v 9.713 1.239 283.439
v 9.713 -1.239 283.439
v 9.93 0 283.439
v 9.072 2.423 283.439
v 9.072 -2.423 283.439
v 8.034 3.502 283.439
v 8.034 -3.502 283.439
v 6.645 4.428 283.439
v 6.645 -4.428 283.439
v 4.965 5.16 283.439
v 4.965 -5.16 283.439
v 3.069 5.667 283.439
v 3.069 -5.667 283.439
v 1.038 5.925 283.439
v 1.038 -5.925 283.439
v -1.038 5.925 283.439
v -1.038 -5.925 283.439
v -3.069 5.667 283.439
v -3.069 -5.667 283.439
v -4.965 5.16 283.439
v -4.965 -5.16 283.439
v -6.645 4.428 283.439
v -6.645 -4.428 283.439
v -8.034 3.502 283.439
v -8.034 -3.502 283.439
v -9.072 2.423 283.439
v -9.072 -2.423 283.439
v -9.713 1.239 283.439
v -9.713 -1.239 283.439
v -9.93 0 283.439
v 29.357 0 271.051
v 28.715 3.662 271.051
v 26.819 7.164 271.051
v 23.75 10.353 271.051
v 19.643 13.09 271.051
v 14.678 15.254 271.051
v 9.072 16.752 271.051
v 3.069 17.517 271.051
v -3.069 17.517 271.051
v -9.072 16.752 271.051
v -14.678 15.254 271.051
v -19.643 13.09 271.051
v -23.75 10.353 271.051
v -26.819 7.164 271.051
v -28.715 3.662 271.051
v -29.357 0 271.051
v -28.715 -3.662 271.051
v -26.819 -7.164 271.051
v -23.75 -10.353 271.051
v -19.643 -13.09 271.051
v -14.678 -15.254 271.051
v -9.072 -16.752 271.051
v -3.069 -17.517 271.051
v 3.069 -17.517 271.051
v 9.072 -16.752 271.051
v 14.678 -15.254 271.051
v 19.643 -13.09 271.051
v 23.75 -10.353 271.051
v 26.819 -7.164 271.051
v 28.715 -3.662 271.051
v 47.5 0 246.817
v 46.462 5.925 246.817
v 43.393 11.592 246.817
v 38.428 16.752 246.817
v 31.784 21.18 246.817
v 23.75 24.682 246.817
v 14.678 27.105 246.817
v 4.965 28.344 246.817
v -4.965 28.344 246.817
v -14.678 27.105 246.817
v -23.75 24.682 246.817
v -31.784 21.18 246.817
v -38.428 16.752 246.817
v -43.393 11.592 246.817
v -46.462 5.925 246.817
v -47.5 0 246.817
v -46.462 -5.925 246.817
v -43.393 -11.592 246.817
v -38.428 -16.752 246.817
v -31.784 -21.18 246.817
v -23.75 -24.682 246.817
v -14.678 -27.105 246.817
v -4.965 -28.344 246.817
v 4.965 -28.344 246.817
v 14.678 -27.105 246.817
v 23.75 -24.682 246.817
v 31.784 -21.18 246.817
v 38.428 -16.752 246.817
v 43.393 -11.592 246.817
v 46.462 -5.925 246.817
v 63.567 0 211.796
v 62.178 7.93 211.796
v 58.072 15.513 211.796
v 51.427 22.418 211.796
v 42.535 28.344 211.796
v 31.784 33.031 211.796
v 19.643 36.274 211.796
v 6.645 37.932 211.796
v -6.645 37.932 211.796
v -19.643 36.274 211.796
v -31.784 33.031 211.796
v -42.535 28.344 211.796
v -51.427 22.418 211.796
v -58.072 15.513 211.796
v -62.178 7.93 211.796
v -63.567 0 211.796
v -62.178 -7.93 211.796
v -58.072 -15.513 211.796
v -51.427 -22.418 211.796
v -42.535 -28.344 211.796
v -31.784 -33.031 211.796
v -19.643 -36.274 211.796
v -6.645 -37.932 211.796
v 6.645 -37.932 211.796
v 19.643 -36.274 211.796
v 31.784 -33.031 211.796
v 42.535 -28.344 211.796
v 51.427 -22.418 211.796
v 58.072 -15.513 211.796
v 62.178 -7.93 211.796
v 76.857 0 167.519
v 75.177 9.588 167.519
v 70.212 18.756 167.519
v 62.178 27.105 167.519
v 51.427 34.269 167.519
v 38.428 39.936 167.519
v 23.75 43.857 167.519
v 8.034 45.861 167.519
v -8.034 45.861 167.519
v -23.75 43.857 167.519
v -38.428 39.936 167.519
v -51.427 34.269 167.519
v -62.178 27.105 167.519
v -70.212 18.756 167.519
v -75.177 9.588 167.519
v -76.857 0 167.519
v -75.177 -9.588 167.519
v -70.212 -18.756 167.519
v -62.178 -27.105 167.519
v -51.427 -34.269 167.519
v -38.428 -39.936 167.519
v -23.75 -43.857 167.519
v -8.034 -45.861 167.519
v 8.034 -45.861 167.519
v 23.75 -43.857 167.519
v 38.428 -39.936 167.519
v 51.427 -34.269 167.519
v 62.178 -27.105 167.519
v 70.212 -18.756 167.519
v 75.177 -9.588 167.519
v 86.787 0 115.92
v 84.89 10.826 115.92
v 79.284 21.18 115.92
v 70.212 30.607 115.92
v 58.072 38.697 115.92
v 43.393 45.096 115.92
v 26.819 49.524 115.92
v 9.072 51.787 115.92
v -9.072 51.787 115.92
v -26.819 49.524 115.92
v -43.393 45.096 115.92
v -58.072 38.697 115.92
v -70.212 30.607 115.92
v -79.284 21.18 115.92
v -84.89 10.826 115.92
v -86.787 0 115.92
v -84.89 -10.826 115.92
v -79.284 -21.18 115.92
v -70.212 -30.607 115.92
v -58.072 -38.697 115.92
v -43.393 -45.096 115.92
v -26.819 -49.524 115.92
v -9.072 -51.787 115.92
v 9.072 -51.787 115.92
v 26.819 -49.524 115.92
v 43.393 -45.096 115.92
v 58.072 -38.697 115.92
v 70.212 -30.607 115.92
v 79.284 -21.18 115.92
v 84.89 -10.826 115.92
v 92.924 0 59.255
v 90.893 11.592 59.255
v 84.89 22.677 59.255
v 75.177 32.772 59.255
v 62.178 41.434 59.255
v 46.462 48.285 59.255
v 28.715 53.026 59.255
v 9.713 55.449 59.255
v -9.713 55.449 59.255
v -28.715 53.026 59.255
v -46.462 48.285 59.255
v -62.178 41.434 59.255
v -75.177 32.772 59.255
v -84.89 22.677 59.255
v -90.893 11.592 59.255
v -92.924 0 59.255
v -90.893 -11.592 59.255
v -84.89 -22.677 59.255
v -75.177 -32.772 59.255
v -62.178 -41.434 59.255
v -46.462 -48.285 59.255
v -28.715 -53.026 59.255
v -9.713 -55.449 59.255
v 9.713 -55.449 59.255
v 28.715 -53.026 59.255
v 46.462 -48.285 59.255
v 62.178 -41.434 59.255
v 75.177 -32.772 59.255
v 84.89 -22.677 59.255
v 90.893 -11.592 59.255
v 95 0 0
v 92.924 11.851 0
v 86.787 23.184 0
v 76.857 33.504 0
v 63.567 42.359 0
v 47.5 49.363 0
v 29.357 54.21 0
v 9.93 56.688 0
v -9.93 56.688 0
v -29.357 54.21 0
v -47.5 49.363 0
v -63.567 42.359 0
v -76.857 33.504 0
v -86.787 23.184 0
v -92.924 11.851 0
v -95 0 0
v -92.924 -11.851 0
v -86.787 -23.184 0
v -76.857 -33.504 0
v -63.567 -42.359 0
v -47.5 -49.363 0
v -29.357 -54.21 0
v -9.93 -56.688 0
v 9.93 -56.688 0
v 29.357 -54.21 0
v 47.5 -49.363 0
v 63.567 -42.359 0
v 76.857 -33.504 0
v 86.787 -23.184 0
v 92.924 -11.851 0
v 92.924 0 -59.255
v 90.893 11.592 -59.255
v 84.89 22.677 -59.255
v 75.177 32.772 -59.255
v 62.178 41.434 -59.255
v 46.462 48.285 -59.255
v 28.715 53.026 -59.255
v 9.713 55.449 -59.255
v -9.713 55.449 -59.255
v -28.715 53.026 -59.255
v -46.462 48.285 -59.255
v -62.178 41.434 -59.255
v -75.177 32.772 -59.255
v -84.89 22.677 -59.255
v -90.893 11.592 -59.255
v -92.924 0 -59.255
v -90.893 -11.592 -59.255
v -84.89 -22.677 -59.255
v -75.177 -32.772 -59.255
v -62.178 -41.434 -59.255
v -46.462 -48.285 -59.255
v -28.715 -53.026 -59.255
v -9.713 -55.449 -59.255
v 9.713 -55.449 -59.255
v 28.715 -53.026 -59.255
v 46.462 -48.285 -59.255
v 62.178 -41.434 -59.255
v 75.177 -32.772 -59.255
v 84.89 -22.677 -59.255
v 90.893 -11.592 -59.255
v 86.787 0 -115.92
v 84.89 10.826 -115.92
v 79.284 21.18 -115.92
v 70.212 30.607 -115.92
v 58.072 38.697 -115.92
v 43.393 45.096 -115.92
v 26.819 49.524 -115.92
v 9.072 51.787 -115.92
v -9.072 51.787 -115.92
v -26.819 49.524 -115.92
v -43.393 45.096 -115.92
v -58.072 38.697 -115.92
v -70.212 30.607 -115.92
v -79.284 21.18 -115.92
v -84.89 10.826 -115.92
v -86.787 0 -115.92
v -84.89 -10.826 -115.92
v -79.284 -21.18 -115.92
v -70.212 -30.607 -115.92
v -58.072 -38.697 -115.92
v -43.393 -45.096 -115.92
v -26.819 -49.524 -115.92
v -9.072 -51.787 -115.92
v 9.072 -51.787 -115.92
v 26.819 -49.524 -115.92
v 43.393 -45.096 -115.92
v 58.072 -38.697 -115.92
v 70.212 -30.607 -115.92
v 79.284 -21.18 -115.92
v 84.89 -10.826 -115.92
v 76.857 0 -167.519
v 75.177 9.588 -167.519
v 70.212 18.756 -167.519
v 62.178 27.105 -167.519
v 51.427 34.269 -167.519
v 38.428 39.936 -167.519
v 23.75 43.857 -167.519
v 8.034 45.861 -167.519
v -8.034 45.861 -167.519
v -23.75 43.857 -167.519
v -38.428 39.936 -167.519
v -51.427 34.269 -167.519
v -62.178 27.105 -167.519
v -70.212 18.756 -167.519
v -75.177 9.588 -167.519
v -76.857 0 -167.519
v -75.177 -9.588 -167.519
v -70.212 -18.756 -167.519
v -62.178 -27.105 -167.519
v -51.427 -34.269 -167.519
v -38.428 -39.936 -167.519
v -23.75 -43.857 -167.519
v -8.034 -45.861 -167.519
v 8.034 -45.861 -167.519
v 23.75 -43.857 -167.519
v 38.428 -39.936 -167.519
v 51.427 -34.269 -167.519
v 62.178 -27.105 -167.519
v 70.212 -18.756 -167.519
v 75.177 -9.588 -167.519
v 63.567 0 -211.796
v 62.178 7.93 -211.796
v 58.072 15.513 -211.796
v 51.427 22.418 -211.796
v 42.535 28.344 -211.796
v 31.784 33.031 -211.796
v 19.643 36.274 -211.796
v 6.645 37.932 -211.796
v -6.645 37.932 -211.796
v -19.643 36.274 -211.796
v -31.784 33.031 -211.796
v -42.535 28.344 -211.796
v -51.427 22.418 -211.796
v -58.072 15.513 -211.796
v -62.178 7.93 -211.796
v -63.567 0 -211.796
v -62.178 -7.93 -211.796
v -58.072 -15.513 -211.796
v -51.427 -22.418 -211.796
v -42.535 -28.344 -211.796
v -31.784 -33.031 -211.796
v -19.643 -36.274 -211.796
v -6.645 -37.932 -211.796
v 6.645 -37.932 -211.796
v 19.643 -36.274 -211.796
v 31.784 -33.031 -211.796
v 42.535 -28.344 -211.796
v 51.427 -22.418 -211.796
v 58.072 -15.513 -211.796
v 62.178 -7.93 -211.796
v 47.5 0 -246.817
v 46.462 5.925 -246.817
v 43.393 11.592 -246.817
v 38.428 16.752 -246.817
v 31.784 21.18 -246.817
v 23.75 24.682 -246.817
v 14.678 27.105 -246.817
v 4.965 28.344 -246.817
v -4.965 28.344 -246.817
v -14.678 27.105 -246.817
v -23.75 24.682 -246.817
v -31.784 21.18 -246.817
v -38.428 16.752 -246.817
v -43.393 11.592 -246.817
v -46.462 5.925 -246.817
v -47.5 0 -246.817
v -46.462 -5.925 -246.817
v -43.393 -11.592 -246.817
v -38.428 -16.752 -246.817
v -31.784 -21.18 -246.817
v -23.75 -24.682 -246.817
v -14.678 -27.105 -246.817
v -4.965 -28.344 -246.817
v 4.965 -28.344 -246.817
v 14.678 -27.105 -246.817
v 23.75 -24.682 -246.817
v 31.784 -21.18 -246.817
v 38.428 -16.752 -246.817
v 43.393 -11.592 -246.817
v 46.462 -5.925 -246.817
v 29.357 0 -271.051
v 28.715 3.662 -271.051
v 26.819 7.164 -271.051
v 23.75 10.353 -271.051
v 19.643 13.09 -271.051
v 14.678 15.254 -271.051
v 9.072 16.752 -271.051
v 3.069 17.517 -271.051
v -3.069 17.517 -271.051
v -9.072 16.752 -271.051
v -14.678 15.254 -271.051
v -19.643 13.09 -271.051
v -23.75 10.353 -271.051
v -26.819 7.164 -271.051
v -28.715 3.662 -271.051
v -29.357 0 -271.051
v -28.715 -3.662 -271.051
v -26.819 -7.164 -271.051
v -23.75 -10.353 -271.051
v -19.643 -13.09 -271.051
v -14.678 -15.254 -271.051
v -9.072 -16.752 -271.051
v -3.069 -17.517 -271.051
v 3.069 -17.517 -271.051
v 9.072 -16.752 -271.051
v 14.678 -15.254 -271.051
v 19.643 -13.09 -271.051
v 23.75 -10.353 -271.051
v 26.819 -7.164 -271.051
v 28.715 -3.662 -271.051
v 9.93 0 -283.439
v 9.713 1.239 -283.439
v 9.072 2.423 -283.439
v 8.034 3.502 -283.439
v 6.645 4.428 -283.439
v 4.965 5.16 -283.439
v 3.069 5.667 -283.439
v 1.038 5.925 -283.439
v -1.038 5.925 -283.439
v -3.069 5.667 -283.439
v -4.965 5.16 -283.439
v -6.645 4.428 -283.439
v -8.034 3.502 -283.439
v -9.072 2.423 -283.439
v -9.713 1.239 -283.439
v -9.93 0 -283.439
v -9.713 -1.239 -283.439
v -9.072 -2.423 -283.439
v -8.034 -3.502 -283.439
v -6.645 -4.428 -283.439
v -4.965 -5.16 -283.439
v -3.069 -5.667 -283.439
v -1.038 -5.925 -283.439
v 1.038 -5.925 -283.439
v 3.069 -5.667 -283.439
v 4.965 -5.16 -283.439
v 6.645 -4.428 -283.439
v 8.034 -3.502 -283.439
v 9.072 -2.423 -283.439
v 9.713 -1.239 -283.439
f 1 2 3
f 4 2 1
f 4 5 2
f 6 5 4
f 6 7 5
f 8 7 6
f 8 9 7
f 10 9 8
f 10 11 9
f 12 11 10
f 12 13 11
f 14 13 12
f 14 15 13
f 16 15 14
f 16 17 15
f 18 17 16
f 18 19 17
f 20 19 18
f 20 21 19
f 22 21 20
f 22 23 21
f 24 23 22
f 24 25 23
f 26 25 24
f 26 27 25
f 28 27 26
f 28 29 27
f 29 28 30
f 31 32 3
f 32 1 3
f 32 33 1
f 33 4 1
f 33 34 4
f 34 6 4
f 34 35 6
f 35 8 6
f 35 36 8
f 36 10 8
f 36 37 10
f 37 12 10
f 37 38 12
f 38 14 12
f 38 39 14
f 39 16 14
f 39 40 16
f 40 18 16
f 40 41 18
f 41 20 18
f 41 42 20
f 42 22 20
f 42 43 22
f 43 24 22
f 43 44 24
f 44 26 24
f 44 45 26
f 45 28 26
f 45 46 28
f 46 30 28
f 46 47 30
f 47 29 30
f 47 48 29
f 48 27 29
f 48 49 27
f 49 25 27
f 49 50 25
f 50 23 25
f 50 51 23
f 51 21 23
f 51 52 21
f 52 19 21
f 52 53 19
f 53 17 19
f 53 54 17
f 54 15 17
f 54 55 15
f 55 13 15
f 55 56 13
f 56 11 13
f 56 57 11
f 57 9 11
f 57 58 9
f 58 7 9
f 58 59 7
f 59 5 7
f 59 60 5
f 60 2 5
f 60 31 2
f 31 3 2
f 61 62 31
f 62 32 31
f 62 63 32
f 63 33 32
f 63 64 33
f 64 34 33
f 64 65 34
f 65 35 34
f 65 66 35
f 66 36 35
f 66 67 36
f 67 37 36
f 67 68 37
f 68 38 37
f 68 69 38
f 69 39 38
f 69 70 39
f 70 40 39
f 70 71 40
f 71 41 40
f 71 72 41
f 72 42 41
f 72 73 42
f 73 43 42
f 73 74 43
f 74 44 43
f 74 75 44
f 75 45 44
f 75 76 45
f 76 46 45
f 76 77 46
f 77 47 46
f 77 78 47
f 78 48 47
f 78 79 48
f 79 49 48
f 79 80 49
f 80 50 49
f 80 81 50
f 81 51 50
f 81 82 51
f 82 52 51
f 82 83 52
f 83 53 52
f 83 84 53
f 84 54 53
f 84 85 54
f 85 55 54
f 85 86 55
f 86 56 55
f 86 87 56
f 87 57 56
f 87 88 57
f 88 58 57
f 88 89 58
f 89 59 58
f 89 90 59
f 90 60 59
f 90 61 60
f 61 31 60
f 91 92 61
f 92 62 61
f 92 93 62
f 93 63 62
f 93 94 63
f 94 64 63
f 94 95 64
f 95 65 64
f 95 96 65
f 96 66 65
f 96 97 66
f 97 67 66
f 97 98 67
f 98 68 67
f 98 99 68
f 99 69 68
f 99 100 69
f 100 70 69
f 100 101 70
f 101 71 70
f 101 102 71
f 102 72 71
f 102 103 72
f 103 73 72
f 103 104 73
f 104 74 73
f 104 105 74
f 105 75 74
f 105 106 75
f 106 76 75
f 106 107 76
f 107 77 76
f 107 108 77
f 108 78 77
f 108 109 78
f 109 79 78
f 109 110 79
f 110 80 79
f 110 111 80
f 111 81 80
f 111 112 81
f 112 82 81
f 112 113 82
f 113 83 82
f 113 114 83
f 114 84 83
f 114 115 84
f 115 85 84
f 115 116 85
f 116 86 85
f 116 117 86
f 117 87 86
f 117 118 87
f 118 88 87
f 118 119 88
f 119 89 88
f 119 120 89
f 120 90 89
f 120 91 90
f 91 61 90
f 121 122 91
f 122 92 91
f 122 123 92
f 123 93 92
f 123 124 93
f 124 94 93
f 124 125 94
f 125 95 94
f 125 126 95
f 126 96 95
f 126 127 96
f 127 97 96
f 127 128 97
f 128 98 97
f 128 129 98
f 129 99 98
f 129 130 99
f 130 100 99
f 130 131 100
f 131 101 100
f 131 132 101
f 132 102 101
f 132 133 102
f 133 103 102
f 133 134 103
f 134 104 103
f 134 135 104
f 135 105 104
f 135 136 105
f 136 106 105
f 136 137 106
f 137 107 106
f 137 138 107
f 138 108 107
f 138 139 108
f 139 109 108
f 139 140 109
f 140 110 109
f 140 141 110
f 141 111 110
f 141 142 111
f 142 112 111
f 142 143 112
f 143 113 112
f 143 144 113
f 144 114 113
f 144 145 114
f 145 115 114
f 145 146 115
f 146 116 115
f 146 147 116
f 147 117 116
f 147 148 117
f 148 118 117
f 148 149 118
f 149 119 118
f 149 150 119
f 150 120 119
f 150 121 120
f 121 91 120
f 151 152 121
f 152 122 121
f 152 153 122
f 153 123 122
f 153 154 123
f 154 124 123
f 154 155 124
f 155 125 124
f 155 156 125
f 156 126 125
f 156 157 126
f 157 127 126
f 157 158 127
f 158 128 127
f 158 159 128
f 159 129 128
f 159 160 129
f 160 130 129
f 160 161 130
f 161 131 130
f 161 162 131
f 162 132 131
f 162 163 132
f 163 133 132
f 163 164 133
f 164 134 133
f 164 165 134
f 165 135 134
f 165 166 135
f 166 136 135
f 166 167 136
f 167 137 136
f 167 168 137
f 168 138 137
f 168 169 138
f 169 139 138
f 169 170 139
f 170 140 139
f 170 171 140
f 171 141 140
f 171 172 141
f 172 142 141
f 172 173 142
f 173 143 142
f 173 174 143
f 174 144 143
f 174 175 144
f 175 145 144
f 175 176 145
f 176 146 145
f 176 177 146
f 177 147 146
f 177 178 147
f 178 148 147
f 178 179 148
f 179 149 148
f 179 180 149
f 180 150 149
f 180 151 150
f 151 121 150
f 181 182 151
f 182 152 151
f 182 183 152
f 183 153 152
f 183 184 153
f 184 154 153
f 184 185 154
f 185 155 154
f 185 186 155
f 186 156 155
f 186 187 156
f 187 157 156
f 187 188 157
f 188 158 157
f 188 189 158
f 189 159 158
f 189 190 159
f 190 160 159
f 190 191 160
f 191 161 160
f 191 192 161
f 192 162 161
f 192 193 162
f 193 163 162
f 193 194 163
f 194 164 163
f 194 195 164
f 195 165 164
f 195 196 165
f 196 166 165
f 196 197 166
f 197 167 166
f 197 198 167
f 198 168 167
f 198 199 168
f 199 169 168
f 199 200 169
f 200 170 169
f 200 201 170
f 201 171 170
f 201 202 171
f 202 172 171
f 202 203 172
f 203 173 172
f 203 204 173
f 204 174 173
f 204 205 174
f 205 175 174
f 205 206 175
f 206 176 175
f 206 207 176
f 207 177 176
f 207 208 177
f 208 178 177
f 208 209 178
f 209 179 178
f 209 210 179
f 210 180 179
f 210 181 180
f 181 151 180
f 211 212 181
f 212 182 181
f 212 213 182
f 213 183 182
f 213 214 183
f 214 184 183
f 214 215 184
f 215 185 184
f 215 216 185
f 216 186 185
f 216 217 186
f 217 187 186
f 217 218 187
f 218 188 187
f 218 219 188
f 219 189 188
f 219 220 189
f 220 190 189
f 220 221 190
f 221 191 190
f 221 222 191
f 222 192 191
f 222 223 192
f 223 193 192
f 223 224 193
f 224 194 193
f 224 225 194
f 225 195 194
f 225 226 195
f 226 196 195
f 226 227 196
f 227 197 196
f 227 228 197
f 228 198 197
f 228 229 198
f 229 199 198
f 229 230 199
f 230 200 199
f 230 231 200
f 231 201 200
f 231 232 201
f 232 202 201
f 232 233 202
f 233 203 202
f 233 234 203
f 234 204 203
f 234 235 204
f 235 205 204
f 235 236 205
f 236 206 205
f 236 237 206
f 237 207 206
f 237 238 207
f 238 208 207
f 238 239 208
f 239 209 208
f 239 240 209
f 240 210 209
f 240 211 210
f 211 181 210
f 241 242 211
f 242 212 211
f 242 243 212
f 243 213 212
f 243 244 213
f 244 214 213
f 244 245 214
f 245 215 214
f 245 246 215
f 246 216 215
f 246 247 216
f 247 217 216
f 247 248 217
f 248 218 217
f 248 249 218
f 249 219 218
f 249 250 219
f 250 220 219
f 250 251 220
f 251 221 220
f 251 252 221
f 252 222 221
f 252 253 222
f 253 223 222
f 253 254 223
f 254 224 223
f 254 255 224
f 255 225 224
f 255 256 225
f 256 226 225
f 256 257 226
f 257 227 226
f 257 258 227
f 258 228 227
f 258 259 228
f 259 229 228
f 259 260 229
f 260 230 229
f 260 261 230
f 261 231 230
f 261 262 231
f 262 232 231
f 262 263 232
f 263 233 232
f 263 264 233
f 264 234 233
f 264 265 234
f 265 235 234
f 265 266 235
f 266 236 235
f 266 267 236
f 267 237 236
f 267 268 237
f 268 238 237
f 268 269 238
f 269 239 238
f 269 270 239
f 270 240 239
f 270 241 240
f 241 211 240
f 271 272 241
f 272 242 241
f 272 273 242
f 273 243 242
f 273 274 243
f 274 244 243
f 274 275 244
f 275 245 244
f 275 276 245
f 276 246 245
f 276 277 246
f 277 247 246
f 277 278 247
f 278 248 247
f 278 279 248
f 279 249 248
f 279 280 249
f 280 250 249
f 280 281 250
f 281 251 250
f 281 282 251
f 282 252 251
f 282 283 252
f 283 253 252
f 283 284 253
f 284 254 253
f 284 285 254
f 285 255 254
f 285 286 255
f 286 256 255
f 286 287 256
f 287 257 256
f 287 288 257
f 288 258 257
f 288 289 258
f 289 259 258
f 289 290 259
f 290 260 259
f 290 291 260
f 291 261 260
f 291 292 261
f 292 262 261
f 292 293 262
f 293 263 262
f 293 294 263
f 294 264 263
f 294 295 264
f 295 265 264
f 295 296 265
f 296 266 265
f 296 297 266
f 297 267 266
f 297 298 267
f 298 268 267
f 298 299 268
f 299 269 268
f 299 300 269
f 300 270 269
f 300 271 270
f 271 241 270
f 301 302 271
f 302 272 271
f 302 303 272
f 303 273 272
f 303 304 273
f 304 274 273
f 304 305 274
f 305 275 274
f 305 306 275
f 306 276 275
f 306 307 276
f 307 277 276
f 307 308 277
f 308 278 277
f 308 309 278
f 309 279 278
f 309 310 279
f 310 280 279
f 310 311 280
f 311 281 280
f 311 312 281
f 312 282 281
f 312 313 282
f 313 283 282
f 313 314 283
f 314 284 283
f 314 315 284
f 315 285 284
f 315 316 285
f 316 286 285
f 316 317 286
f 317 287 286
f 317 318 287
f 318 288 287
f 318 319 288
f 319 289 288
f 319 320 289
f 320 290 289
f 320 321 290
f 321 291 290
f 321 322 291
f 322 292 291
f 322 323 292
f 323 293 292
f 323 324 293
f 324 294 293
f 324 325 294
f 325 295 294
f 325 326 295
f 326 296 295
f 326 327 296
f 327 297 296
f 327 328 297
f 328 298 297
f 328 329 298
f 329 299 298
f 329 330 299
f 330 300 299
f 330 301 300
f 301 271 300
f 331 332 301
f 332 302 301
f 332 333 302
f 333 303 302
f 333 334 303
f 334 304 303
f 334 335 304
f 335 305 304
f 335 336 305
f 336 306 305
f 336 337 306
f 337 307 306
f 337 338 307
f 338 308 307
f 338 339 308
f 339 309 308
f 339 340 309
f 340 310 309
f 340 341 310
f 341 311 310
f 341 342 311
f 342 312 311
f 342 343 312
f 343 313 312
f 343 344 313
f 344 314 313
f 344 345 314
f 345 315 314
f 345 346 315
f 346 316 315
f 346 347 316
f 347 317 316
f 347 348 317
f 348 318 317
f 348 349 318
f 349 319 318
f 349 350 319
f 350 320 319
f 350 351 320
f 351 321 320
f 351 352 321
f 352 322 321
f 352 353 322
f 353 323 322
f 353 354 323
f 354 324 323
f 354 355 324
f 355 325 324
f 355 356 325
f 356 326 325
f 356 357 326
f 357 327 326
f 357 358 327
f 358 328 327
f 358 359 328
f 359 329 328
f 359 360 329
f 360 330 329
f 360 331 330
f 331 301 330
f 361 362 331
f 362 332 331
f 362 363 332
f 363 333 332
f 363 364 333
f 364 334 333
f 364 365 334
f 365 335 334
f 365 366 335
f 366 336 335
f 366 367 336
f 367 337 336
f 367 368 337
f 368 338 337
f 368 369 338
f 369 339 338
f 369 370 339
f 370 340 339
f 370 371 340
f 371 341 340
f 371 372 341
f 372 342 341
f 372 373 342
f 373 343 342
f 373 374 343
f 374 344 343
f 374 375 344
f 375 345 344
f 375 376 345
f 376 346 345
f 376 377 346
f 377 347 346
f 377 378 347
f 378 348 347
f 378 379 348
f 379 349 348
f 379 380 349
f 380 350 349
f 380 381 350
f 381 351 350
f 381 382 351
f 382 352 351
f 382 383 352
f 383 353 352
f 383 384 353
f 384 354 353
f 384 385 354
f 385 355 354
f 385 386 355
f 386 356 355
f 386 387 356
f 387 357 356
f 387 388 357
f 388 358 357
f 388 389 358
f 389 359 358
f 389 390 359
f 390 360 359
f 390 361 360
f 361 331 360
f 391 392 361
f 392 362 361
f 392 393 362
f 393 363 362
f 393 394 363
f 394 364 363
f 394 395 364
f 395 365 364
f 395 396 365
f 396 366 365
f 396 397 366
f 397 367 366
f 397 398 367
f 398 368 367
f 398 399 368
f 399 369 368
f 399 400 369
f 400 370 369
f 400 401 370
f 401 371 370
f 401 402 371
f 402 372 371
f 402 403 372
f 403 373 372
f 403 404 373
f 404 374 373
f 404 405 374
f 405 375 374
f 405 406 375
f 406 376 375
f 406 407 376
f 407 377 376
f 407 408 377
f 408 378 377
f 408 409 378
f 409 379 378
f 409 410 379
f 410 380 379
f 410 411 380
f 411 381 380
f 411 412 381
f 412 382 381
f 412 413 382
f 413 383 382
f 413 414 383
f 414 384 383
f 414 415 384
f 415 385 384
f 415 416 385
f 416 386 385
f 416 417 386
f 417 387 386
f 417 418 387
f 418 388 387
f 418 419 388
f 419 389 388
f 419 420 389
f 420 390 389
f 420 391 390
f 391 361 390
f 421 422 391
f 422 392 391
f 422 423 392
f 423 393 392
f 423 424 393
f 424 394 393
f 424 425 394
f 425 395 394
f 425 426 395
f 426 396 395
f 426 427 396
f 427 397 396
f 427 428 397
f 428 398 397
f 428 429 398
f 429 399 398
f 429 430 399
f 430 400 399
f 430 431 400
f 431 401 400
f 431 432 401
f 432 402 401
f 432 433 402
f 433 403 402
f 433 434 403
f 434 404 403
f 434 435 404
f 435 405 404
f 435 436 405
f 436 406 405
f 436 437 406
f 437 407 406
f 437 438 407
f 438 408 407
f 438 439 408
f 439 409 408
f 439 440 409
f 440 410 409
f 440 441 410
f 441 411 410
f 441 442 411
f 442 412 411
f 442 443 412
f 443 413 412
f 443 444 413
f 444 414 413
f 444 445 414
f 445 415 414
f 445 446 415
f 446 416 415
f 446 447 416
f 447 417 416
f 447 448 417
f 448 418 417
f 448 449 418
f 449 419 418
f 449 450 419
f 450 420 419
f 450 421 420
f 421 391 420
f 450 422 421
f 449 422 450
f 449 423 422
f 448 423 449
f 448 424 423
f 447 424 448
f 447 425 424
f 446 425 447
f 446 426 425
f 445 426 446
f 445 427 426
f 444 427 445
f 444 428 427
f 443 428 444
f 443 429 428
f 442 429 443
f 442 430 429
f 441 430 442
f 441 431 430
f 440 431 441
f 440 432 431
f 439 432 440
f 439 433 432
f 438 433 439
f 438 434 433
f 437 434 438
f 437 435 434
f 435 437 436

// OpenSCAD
// Generated by SolidPython 1.0.1 on 2020-07-29 00:46:46


scale(v = [5, 3, 15]) {
	sphere(r = 19);
}
/***********************************************
*********      SolidPython code:      **********
************************************************
 
# import packages: SolidPython
from solid import *
from solid.utils import *
from itertools import chain, combinations, permutations


class Resize:

    def __init__(self, scad_file):
        self.scad_file = scad_file
        #self.scad_file = import_scad(scad_file)
        # cone/cylinder param:
        self.r1 = 0
        self.r2 = 0
        self.h = 0
        # rectangular prism param:
        self.w = 0
        self.l = 0
        # ellipse param:
        self.r = 0

    # import OpenScad code (file name corresponds to shape)


    # classify shape + parameters
    def assign(self, param1, param2, param3):
        if self.scad_file == 'cone.scad':
            self.r1 = param1
            self.r2 = param2
            self.h = param3
        elif self.scad_file == 'cylinder.scad':
            self.r1 = param1
            self.r2 = param2
            self.h = param3
        elif self.scad_file == 'rectangularPrism.scad':
            self.h = param1
            self.l = param2
            self.w = param3
        else:
            self.r = param1
            self.h = param2

    # resize parameters
    def iterate(self):
        x = range(3, 20, 2)
        i = 1
        if self.scad_file == 'cone.scad':
            tempList = list(permutations(x, 2))
            for temp in tempList:
                param1 = temp[0]
                param2 = temp[1]
                filepath = 'produced_scad_files/' + 'cone' + str(param1) + '_' + str(param2) + '_' + '.scad'
                scad_render_to_file(cylinder(h=param1, r1=param2, r2=0), filepath)

        elif self.scad_file == 'cylinder.scad':
            tempList = list(permutations(x, 3))
            for temp in tempList:
                param1 = temp[0]
                param2 = temp[1]
                filepath = 'produced_scad_files/' + 'cylinder' + str(param1) + '_' + str(param2) + '_' + '.scad'
                scad_render_to_file(cylinder(h=param1, r1=param2, r2=param2), filepath)

        elif self.scad_file == 'rectangularPrism.scad':
            tempList = list(permutations(x, 3))
            for temp in tempList:
                param1 = temp[0]
                param2 = temp[1]
                param3 = temp[2]
                filepath = 'produced_scad_files/' + 'rectangularPrism' + str(param1) + '_' + str(param2) + '_' + str(
                    param3) + '.scad'
                scad_render_to_file(cube(size=(param1, param2, param3)), filepath)

        elif self.scad_file == 'ellipse.scad':
            tempList = list(permutations(x, 4))
            for temp in tempList:
                param1 = temp[0]
                param2 = temp[1]
                param3 = temp[2]
                param4 = temp[3]
                filepath = 'produced_scad_files/' + 'ellipse' + str(param1) + '_' + str(param2) + '_' + str(param3) + '_' + str(param4) + '.scad'
                scad_render_to_file(scale([param1, param2, param3])(sphere(r=param4)), filepath)

    def render_to_scadfile(self):
        scad_render_to_file(scad, 'example.scad') 
 
************************************************/
